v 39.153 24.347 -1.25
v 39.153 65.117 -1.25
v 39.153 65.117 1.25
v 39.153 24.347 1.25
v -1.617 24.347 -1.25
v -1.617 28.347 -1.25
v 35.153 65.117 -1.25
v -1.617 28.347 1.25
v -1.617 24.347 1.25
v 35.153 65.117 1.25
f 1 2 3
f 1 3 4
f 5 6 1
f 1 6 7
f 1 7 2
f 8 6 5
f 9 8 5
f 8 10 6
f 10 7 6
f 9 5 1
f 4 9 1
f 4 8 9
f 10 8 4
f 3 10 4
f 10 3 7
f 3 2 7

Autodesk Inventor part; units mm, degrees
ref_plane "YZ Plane" through (0, 0, 0) normal (1, 0, 0) x (0, 1, 0)
ref_plane "XZ Plane" through (0, 0, 0) normal (0, 1, 0) x (-1, 0, 0)
ref_plane "XY Plane" through (0, 0, 0) normal (0, 0, 1) x (1, 0, 0)
sketch "Sketch1" plane through (0, 0, 0) normal (0, 0, 1) x (1, 0, 0)
  line L0 (39.1526, 75.1474) -> (39.1526, -26.4526) projected
  line L1 (-5.5514, 24.3474) -> (39.1526, 24.3474) projected
  line L2 (39.1526, 65.117) -> (35.1526, 65.117)
  line L3 (35.1526, 65.117) -> (-1.617, 28.3474)
  line L4 (-1.617, 28.3474) -> (-1.617, 24.3474)
  dimension "d0" = 4
  dimension "d1" = 4
  dimension "d2" = 45
  dimension "d3" = 52
extrude "Extrusion1" add sketch "Sketch1" along normal mid plane 2.5
properties part number "gusset"
